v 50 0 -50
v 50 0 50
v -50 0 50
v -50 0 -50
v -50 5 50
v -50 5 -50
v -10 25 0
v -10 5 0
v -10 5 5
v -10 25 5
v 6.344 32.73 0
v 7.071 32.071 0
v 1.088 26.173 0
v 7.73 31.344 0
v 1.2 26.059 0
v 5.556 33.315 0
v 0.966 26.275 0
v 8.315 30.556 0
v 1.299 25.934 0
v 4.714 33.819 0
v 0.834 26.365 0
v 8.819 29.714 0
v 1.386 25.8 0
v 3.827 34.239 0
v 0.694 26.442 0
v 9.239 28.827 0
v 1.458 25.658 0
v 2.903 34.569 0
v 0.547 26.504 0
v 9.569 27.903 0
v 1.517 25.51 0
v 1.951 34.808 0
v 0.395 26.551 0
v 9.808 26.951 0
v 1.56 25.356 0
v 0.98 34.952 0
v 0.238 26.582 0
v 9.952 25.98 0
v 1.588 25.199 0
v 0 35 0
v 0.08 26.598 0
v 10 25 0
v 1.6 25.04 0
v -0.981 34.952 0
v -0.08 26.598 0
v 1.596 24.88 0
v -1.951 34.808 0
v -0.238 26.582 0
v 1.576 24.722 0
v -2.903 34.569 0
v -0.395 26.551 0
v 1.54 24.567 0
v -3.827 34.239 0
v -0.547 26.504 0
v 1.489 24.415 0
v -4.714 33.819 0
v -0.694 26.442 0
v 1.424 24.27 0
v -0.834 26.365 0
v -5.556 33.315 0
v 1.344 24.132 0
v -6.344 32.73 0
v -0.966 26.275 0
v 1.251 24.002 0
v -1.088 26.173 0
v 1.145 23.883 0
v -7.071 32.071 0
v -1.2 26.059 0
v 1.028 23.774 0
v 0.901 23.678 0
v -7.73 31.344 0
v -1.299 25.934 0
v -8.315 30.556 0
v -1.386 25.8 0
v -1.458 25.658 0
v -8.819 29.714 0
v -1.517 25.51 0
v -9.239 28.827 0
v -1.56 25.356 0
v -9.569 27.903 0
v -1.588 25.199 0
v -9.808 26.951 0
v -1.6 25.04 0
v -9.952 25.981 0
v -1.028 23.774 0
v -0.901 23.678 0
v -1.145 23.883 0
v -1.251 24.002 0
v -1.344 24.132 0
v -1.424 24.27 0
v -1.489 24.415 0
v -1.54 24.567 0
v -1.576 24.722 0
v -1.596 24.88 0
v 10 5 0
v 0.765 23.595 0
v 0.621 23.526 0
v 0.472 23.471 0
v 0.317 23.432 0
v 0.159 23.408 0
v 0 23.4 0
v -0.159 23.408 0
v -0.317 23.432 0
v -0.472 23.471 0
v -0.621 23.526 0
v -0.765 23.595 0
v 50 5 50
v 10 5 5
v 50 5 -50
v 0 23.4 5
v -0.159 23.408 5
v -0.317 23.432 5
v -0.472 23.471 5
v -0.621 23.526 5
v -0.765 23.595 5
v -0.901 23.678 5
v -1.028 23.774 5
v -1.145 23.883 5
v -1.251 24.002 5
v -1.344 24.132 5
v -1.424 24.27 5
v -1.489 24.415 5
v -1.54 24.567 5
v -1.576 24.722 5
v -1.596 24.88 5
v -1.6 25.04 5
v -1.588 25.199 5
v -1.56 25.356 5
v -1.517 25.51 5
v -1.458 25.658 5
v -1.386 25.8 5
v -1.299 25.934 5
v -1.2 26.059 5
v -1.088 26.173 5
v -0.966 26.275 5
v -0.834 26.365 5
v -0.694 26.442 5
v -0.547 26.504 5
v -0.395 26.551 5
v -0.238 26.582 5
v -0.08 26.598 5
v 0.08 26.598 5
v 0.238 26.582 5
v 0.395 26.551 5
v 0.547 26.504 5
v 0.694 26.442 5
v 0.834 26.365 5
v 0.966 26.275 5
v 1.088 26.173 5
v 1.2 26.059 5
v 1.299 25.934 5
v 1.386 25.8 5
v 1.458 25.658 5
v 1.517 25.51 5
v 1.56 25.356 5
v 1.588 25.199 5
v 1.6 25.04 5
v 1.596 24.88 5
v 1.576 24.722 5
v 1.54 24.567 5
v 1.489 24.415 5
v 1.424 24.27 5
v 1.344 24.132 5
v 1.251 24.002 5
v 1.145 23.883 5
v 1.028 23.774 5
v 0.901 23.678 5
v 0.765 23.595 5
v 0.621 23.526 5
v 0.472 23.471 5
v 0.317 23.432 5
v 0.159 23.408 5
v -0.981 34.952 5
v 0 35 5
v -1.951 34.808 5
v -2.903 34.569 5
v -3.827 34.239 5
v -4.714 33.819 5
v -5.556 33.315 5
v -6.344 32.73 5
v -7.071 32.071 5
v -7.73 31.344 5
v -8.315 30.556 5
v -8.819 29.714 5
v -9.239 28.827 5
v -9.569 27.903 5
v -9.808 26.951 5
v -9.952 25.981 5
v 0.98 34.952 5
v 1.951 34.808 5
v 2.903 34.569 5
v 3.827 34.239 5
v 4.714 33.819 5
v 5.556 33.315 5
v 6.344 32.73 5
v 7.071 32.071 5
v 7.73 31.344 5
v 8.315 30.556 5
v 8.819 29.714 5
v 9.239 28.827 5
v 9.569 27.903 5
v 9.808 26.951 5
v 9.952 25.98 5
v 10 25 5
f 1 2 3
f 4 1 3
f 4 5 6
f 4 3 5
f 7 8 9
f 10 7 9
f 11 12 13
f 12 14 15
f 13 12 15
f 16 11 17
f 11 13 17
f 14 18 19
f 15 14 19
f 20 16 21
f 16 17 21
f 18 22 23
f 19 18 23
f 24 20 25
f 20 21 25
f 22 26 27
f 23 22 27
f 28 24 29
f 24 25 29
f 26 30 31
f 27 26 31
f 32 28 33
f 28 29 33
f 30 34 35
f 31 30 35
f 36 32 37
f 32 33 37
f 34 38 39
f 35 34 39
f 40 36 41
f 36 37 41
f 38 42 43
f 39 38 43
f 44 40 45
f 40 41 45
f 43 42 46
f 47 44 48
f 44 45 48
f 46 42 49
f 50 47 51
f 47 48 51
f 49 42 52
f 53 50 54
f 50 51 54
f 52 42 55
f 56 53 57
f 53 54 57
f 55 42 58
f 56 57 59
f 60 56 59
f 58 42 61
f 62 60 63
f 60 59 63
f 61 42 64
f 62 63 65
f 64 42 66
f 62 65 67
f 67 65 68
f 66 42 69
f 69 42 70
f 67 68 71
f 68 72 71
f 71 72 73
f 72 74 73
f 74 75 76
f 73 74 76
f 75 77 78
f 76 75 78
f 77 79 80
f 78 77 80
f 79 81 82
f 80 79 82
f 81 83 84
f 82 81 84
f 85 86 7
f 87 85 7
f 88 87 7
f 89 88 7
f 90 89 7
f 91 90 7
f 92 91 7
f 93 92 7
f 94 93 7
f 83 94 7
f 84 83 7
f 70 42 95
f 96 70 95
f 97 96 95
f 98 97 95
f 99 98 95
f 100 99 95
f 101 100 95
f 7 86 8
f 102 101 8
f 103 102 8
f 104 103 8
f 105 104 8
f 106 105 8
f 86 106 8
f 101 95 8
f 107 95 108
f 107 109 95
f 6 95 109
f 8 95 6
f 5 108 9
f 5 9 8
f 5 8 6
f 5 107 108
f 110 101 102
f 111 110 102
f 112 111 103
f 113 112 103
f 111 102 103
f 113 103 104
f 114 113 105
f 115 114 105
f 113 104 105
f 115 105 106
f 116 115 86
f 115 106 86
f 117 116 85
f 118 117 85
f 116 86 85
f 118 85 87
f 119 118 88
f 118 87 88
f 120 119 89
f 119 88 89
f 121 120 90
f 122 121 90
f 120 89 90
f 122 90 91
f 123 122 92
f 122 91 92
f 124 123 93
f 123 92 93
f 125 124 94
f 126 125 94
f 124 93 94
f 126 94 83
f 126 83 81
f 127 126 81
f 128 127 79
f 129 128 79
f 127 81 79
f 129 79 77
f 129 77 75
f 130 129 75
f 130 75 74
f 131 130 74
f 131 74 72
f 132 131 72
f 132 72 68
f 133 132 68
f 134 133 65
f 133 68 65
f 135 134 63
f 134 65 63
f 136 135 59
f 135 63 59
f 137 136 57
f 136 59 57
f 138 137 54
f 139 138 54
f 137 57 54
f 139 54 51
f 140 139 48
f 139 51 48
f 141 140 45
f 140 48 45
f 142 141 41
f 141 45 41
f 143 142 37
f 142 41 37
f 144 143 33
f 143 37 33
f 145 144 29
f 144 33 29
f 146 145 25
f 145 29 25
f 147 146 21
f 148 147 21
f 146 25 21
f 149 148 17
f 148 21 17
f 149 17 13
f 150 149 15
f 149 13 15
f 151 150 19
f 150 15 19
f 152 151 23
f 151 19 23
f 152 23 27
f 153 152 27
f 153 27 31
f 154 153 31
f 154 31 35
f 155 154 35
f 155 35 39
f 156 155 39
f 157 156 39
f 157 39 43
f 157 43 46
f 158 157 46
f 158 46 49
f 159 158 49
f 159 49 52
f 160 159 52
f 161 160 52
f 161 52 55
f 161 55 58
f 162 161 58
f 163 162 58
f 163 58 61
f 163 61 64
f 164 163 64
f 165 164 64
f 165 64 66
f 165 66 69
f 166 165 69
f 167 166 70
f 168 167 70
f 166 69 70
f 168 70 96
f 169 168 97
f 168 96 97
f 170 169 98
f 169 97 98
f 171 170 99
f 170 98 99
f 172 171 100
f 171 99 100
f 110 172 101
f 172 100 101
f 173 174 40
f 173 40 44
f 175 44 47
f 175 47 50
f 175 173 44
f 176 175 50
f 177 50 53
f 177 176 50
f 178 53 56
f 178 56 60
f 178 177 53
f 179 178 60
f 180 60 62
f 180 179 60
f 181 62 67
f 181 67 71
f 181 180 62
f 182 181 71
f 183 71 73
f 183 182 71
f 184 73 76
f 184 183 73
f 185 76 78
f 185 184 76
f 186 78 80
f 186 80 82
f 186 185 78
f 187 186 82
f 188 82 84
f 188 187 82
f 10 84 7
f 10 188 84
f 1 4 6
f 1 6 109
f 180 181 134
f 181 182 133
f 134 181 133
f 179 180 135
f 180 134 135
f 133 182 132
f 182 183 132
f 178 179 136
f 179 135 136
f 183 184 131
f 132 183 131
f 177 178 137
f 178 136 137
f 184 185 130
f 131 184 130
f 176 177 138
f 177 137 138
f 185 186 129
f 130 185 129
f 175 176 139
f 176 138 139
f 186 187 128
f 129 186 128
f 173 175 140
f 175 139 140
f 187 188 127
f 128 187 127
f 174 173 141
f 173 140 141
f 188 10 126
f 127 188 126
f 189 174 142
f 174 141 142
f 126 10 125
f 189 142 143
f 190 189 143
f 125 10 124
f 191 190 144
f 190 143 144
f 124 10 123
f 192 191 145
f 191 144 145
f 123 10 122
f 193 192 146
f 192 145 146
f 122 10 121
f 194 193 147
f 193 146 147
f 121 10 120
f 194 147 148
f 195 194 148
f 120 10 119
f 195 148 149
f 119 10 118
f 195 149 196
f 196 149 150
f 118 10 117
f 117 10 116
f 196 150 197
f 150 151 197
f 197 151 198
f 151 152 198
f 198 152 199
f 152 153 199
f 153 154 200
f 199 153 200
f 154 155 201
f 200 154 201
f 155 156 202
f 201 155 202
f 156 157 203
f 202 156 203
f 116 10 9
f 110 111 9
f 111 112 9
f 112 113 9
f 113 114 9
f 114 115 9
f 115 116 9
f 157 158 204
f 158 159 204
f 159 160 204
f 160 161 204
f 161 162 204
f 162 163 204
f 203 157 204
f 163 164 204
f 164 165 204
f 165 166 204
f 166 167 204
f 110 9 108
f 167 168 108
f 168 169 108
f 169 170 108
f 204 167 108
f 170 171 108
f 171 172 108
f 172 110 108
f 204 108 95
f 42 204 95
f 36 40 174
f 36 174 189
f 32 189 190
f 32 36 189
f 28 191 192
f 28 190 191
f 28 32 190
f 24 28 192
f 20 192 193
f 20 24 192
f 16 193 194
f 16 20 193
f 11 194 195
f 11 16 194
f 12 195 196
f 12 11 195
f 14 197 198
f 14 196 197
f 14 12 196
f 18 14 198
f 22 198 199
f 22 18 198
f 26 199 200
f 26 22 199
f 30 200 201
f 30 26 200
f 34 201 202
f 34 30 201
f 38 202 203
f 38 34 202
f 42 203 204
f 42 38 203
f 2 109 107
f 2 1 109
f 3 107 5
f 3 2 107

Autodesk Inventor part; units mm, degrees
ref_plane "YZ Plane" through (0, 0, 0) normal (1, 0, 0) x (0, 1, 0)
ref_plane "XZ Plane" through (0, 0, 0) normal (0, 1, 0) x (-1, 0, 0)
ref_plane "XY Plane" through (0, 0, 0) normal (0, 0, 1) x (1, 0, 0)
sketch "Szkic1" plane through (0, 0, 0) normal (0, 1, 0) x (-1, 0, 0)
  line L0 (-50, 50) -> (50, 50)
  line L1 (50, 50) -> (50, -50)
  line L2 (50, -50) -> (-50, -50)
  line L3 (-50, -50) -> (-50, 50)
  line L4 (-50, 50) -> (50, -50) construction
  line L5 (50, 50) -> (-50, -50) construction
  point P0 (0, 0)
  dimension "d0" = 100
  dimension "d1" = 100
extrude "Wyciągnięcie proste1" add sketch "Szkic1" along normal blind 5
sketch "Szkic2" plane through (0, 5, 0) normal (0, 1, 0) x (1, 0, 0)
  line L0 (10, 0) -> (-10, 0)
  line L1 (-10, 0) -> (-10, -5)
  line L2 (-10, -5) -> (10, -5)
  line L3 (10, -5) -> (10, 0)
  point P0 (0, 0)
  dimension "d4" = 20
  dimension "d5" = 10
  dimension "d6" = 5
  dimension "d7" = 0
extrude "Wyciągnięcie proste2" add sketch "Szkic2" along normal blind 30
fillet "Zaokrąglenie1" radius 10 1 edges at (10, 35, 2.5)
fillet "Zaokrąglenie2" radius 10 1 edges at (-10, 35, 2.5)
sketch "Szkic3" plane through (-10, 5, 5) normal (0, 0, 1) x (1, 0, 0)
  arc A0 (20, 20) -> (0, 20) centre (10, 20) ccw projected
  point P0 (10, -5)
hole "Otwór1" at (0, 25, 5) direction (0, 0, -1) diameter 3.2 end through all
properties part number "podstawa"
